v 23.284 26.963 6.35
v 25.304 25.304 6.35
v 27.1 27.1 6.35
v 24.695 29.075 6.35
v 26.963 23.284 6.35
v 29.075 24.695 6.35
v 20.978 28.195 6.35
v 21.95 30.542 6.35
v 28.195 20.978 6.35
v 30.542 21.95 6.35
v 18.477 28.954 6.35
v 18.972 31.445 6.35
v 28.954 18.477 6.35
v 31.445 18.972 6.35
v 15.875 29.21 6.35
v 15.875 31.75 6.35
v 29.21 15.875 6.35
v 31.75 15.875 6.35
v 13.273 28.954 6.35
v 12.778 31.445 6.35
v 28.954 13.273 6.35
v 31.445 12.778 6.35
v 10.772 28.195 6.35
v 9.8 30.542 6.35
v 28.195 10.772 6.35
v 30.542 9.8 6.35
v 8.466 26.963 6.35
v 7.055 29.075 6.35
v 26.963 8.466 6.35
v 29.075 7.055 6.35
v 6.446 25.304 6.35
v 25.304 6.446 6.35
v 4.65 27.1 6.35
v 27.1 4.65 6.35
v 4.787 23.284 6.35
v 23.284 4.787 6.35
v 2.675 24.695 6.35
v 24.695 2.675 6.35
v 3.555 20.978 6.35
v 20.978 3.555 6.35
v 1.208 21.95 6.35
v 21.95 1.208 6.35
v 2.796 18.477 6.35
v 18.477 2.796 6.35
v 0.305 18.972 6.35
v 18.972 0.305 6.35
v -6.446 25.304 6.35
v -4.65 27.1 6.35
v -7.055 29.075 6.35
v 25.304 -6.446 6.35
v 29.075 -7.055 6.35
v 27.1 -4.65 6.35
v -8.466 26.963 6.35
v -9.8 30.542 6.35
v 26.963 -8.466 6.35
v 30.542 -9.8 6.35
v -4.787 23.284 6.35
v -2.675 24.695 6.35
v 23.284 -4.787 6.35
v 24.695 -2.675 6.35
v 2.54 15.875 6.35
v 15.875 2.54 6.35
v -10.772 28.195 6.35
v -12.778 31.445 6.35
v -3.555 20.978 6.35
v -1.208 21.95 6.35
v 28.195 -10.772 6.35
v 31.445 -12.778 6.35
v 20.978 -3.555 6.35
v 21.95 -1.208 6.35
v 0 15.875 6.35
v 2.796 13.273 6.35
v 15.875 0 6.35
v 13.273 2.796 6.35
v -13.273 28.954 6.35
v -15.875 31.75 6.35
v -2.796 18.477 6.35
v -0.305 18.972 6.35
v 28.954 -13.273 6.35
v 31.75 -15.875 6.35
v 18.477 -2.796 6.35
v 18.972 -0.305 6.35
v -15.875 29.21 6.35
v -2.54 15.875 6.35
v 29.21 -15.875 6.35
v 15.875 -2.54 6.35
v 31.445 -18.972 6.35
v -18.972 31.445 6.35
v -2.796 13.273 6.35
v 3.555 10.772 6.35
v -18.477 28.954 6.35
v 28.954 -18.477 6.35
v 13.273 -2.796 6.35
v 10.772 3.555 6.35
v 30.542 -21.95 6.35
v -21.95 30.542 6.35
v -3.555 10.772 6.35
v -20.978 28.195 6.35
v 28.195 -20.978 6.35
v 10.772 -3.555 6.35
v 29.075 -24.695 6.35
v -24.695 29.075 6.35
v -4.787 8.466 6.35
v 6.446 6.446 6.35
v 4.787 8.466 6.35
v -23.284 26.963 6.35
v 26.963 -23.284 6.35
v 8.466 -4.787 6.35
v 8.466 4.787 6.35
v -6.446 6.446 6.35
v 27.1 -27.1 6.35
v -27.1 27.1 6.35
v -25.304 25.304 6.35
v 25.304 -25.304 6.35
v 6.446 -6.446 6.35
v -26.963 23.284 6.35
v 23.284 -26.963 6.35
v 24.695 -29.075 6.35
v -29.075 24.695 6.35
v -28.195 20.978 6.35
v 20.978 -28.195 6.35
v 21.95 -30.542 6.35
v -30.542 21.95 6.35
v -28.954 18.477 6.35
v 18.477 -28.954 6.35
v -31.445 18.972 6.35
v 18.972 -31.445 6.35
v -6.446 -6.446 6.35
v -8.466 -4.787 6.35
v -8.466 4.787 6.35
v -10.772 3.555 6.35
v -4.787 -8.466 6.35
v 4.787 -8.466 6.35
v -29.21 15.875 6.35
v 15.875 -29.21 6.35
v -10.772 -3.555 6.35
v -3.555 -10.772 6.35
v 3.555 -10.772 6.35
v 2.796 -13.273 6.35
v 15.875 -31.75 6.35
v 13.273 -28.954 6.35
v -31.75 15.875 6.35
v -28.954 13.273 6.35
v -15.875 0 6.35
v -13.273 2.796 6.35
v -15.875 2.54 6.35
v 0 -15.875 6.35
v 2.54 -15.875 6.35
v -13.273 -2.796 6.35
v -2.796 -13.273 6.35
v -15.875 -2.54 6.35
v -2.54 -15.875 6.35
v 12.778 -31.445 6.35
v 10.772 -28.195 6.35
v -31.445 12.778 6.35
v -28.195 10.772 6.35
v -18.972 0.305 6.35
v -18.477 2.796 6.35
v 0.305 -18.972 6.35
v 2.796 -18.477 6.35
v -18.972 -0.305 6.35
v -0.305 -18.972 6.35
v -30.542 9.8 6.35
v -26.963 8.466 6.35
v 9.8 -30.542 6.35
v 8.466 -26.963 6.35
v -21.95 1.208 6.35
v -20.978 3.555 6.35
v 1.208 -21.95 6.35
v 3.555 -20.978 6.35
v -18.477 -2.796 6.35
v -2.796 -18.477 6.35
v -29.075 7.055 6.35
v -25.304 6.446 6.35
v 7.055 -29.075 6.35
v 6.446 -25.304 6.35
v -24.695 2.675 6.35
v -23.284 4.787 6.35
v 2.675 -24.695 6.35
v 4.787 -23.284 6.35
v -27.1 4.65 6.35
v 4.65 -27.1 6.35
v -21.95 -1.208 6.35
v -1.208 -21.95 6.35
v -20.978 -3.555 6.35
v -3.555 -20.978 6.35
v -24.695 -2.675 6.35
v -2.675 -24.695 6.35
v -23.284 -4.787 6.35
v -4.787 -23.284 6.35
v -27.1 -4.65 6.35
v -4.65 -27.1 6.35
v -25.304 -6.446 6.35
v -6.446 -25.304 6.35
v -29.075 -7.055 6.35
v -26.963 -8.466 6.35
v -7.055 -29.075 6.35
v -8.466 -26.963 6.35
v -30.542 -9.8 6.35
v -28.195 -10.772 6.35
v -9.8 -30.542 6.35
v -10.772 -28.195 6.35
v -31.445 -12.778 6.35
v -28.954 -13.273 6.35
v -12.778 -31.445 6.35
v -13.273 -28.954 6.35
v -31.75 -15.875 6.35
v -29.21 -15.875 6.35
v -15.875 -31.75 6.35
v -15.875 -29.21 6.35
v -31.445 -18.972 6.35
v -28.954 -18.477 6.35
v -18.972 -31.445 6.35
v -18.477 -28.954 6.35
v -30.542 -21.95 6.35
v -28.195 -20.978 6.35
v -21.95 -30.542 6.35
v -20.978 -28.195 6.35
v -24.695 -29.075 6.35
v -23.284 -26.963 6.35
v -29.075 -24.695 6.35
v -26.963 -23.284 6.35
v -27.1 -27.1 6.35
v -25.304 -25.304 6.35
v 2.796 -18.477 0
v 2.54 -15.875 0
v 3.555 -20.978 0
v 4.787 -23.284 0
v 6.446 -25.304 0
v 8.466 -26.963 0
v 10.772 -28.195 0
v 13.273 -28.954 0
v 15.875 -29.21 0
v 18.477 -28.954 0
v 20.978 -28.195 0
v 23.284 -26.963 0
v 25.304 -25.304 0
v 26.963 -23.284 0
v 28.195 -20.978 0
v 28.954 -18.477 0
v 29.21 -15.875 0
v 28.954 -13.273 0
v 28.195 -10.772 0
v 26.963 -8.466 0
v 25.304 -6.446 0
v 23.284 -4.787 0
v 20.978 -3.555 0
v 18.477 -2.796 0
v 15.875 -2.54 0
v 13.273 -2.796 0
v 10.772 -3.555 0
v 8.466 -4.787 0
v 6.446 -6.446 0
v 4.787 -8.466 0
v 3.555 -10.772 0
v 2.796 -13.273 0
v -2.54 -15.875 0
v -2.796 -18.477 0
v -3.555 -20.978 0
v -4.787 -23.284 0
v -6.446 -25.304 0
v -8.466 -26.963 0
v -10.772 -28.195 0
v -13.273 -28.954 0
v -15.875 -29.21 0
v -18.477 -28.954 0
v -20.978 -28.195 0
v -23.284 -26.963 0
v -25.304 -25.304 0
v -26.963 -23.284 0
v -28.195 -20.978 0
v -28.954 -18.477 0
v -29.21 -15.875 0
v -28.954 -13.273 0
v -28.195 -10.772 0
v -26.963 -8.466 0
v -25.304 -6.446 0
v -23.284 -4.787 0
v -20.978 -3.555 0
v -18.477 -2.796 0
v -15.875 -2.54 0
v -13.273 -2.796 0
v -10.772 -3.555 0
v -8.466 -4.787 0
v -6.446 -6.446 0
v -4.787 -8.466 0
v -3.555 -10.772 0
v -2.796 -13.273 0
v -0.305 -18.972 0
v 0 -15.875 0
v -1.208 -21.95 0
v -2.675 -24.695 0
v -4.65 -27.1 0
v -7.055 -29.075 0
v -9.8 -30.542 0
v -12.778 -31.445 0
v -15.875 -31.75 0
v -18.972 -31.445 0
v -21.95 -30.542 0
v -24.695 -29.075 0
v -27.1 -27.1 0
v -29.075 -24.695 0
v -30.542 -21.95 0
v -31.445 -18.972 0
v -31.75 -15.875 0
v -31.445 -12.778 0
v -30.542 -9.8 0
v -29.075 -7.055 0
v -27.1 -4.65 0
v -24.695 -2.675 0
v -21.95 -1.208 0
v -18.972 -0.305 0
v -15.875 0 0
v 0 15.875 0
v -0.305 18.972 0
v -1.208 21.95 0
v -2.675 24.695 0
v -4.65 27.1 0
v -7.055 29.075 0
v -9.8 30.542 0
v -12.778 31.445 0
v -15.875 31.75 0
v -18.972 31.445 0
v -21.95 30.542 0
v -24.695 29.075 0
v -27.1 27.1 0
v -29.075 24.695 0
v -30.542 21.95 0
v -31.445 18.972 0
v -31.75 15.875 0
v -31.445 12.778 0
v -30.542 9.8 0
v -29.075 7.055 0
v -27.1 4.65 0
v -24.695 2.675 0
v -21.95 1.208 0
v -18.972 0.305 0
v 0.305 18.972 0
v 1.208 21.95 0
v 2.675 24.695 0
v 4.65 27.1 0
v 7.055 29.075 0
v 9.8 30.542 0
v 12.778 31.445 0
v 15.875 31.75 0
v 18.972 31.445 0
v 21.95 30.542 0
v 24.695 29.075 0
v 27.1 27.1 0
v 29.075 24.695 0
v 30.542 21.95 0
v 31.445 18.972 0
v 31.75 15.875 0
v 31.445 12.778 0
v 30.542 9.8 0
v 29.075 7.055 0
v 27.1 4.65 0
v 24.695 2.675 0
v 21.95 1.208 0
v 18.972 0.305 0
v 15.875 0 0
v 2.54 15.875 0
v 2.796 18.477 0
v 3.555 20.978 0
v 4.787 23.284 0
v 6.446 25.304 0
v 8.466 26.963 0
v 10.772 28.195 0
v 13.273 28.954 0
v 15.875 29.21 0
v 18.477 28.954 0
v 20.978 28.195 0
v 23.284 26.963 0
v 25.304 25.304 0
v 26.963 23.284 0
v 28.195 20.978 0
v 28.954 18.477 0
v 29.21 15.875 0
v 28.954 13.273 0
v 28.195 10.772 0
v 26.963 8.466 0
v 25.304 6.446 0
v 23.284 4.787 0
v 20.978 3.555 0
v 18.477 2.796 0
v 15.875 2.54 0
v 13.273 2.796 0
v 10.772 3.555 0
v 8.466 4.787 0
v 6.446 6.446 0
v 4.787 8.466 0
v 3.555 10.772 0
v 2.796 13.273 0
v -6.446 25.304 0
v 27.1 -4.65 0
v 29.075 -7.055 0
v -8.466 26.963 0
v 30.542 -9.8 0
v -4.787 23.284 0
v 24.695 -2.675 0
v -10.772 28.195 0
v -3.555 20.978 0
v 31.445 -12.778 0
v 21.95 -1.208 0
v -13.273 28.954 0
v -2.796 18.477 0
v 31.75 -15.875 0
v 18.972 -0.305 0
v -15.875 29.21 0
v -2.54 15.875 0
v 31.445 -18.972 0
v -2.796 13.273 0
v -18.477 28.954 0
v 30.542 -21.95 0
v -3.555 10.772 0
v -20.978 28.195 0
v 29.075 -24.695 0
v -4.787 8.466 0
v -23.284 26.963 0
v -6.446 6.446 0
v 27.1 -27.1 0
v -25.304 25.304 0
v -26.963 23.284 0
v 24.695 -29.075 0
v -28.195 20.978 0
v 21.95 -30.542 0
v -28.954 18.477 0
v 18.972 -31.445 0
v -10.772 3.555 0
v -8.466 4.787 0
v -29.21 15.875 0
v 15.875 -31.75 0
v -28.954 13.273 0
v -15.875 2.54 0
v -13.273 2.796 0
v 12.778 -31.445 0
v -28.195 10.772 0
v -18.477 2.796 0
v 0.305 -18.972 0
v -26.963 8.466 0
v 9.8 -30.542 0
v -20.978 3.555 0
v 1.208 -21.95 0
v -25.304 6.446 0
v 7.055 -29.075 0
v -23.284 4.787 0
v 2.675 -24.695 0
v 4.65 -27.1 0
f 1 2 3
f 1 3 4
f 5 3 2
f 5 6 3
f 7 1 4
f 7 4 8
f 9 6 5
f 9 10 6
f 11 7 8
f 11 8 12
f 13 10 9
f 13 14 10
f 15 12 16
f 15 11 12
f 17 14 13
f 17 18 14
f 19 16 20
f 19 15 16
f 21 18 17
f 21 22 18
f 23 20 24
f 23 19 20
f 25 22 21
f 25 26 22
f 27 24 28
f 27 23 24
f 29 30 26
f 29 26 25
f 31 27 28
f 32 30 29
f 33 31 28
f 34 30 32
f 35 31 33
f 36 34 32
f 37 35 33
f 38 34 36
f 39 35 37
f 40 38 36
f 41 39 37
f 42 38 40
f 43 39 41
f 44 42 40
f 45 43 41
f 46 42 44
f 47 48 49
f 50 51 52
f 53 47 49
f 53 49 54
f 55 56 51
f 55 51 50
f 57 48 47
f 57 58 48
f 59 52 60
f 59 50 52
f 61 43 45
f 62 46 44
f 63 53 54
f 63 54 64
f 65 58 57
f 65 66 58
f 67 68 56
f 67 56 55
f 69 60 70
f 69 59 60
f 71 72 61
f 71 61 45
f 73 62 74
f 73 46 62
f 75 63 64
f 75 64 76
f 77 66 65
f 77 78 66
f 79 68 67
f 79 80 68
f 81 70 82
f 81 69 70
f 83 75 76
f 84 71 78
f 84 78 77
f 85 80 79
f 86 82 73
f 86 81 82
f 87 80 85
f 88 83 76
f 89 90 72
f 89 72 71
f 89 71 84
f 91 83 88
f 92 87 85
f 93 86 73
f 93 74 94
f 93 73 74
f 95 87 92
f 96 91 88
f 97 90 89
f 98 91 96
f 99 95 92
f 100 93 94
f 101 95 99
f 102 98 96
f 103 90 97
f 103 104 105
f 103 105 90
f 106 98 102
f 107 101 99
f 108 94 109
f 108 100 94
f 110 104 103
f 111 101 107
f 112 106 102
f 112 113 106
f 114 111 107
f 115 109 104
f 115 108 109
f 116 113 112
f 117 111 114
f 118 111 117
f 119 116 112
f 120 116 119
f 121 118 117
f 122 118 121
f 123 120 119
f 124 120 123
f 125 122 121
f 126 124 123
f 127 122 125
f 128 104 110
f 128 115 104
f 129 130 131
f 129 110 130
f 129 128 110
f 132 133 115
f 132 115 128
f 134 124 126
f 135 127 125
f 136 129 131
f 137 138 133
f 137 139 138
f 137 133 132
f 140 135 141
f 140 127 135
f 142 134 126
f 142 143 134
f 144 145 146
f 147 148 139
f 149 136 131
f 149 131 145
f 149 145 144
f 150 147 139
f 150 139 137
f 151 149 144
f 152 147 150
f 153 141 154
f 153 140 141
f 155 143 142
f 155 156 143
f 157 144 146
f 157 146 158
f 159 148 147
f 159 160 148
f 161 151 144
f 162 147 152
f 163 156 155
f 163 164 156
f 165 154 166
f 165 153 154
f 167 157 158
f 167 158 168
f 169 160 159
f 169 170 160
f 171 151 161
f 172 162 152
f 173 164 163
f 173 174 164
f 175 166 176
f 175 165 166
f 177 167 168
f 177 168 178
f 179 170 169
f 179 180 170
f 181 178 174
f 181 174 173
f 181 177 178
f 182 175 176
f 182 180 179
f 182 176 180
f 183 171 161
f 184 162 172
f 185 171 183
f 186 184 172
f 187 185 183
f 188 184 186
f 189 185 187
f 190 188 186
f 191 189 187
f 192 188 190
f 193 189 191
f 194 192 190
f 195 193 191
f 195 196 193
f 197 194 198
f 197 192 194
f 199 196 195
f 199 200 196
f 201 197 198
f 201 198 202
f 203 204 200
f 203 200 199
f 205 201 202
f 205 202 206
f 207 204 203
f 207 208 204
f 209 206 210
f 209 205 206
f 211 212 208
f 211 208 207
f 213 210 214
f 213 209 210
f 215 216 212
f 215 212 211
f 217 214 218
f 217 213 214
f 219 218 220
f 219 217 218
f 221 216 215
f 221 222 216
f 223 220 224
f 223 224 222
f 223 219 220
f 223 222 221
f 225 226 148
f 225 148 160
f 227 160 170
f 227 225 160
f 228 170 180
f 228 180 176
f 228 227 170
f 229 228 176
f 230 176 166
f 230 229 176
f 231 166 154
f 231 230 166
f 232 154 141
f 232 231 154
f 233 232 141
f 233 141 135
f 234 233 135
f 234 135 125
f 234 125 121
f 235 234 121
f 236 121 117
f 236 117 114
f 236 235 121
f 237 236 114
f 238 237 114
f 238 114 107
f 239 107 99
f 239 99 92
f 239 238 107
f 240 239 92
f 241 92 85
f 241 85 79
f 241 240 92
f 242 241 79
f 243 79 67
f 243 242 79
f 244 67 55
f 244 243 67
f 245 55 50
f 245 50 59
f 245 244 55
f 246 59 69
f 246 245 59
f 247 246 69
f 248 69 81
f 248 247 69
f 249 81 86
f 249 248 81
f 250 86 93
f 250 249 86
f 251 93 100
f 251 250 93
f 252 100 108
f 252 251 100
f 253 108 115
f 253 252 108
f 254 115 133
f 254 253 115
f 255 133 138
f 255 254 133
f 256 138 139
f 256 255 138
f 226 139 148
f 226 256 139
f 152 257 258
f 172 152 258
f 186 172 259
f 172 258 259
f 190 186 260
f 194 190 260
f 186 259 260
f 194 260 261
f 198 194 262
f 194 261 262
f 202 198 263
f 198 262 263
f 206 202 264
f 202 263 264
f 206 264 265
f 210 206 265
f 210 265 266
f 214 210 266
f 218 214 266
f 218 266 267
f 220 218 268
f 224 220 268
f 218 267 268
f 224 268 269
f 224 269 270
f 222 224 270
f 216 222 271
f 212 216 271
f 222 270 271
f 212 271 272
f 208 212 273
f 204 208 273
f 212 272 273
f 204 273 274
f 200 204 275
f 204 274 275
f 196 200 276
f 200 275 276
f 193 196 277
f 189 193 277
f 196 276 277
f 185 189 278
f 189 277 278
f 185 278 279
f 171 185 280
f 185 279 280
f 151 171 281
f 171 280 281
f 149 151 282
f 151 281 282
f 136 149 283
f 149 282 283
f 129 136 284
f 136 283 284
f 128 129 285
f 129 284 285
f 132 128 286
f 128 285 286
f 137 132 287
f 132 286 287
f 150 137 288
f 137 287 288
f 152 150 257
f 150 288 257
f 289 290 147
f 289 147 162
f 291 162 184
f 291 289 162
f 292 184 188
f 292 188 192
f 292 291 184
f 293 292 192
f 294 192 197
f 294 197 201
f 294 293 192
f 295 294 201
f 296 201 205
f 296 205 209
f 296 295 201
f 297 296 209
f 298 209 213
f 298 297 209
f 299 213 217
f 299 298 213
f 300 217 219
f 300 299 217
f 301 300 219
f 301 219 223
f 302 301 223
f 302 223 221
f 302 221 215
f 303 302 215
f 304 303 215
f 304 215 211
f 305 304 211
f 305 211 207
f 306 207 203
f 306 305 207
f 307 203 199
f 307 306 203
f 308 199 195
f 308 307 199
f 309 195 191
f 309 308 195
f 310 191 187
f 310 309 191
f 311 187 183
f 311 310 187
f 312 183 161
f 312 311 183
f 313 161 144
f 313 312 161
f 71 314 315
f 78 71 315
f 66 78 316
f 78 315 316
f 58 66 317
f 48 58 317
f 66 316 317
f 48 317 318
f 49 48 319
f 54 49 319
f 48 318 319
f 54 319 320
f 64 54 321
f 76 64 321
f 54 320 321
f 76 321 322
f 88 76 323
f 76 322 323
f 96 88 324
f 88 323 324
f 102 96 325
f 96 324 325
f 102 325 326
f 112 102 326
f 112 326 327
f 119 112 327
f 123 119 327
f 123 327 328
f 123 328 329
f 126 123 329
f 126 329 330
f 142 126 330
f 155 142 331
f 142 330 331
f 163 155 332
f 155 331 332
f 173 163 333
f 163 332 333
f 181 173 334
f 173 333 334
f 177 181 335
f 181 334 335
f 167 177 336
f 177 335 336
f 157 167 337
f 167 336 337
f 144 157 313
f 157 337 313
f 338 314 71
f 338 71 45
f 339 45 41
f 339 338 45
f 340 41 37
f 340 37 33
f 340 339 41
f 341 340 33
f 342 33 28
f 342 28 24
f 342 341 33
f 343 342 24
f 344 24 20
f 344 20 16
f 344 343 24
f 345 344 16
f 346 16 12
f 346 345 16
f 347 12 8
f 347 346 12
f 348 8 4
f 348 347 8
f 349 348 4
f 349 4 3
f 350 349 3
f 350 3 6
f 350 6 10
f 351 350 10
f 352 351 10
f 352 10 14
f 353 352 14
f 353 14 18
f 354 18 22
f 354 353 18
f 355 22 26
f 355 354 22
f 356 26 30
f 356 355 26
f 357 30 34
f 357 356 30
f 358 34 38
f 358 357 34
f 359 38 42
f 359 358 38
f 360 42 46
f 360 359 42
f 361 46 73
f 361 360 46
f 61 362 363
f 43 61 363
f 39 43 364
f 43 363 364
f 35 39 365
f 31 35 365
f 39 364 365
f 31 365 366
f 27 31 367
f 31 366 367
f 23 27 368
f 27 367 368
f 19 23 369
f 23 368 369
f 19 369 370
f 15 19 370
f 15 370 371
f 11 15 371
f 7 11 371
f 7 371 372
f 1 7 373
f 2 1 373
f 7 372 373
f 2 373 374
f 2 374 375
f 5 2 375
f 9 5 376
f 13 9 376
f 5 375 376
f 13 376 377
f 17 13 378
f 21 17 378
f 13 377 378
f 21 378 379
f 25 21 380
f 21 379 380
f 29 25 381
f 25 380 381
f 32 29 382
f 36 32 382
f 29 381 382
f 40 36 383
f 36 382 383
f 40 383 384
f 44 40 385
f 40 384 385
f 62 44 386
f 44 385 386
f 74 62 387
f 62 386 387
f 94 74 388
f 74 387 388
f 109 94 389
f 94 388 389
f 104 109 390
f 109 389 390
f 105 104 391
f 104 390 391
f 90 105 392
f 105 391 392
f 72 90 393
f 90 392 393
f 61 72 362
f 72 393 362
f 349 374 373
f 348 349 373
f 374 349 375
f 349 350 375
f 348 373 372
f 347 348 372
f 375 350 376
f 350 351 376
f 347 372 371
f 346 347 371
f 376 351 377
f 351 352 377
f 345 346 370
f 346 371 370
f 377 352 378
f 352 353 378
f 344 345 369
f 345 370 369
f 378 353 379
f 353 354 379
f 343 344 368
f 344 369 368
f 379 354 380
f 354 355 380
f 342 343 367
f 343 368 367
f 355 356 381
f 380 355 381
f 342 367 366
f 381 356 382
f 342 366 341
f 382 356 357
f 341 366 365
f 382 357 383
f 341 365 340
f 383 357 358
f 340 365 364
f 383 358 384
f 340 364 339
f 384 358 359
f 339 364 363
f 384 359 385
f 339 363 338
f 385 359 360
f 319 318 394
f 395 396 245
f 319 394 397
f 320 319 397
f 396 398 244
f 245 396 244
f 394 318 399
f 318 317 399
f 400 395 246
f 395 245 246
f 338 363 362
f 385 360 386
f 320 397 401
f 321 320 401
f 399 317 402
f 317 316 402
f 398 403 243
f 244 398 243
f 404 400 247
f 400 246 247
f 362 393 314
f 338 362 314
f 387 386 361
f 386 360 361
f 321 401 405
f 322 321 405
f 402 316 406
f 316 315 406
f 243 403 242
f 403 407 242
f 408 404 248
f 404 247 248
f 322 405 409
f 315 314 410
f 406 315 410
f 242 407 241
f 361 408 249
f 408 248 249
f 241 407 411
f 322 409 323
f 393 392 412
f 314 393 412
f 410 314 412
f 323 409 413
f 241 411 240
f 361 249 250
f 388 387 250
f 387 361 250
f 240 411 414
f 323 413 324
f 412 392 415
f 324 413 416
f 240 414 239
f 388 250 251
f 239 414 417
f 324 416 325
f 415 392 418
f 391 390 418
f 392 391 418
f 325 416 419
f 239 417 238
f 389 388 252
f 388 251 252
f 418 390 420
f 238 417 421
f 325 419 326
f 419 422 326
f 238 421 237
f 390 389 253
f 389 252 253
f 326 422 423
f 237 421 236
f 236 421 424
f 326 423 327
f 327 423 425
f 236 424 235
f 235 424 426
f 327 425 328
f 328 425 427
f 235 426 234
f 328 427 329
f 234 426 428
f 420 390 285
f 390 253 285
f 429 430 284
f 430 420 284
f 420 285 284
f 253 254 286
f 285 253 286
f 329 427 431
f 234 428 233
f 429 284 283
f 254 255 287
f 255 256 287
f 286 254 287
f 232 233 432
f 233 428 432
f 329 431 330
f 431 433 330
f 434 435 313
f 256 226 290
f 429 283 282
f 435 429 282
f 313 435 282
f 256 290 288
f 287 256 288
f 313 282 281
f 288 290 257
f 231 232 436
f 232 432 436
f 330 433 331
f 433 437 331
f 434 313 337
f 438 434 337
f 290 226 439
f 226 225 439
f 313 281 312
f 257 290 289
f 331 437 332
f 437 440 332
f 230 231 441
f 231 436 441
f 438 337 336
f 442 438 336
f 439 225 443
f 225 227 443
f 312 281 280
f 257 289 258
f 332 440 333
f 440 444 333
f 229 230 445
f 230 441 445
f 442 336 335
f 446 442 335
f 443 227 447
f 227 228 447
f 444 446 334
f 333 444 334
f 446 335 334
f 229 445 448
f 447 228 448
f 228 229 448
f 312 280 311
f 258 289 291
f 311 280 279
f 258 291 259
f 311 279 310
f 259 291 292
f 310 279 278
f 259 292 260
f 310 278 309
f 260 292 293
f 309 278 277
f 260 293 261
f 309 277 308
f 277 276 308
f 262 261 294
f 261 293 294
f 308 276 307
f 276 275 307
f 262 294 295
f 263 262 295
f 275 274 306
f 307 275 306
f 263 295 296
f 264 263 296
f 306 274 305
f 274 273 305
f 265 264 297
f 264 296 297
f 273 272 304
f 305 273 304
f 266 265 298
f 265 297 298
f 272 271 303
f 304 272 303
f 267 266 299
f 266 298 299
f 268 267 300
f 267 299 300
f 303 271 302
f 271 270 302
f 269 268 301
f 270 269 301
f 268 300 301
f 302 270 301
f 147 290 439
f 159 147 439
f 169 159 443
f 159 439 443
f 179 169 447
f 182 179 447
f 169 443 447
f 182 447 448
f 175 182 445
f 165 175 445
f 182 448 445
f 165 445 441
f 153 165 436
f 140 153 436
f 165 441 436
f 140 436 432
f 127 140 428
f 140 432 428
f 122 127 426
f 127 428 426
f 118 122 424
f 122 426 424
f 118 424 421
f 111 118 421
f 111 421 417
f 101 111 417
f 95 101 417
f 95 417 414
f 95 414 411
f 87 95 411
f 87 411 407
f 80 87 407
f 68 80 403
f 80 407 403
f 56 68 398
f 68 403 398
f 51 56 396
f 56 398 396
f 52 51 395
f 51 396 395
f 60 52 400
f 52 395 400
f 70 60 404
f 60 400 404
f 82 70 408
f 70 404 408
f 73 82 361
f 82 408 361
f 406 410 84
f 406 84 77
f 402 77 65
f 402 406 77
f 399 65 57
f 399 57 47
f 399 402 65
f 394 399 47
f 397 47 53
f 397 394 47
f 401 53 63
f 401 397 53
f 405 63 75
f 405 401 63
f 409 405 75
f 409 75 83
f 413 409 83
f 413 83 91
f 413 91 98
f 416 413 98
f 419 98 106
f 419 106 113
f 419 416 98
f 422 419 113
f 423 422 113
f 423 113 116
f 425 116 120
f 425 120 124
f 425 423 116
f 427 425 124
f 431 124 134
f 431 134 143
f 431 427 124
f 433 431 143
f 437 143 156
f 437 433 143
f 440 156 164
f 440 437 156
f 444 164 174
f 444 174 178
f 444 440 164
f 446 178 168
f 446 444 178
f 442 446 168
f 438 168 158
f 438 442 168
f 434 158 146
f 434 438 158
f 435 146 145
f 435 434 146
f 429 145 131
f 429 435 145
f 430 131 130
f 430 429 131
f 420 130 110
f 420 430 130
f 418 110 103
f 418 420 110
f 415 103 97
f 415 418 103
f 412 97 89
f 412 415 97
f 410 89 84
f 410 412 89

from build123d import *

# Parameters (mm, degrees)
F0_R     = 13.335
F1_DEPTH = 6.35


with BuildPart() as f1:
    # F0 (on Top) → F1 (new body)
    with BuildSketch(Plane.XY):
        with BuildLine():
            Line((0, 0), (0, 15.875))
            ThreePointArc((0, 15.875), (-27.10032, 27.10032), (-15.875, 0))
            Line((-15.875, 0), (0, 0))
        make_face()
        with Locations((-15.875, 15.875)):
            Circle(F0_R, mode=Mode.SUBTRACT)
    extrude(amount=F1_DEPTH)

    # F2: F1 across plane


with BuildPart() as f1_1:
    add(f1.part)
    add(f1.part.mirror(Plane.YZ))

    # F3: F1 across plane


with BuildPart() as f1_2:
    add(f1_1.part)
    add(f1_1.part.mirror(Plane.XZ))


solid = f1_2.part
